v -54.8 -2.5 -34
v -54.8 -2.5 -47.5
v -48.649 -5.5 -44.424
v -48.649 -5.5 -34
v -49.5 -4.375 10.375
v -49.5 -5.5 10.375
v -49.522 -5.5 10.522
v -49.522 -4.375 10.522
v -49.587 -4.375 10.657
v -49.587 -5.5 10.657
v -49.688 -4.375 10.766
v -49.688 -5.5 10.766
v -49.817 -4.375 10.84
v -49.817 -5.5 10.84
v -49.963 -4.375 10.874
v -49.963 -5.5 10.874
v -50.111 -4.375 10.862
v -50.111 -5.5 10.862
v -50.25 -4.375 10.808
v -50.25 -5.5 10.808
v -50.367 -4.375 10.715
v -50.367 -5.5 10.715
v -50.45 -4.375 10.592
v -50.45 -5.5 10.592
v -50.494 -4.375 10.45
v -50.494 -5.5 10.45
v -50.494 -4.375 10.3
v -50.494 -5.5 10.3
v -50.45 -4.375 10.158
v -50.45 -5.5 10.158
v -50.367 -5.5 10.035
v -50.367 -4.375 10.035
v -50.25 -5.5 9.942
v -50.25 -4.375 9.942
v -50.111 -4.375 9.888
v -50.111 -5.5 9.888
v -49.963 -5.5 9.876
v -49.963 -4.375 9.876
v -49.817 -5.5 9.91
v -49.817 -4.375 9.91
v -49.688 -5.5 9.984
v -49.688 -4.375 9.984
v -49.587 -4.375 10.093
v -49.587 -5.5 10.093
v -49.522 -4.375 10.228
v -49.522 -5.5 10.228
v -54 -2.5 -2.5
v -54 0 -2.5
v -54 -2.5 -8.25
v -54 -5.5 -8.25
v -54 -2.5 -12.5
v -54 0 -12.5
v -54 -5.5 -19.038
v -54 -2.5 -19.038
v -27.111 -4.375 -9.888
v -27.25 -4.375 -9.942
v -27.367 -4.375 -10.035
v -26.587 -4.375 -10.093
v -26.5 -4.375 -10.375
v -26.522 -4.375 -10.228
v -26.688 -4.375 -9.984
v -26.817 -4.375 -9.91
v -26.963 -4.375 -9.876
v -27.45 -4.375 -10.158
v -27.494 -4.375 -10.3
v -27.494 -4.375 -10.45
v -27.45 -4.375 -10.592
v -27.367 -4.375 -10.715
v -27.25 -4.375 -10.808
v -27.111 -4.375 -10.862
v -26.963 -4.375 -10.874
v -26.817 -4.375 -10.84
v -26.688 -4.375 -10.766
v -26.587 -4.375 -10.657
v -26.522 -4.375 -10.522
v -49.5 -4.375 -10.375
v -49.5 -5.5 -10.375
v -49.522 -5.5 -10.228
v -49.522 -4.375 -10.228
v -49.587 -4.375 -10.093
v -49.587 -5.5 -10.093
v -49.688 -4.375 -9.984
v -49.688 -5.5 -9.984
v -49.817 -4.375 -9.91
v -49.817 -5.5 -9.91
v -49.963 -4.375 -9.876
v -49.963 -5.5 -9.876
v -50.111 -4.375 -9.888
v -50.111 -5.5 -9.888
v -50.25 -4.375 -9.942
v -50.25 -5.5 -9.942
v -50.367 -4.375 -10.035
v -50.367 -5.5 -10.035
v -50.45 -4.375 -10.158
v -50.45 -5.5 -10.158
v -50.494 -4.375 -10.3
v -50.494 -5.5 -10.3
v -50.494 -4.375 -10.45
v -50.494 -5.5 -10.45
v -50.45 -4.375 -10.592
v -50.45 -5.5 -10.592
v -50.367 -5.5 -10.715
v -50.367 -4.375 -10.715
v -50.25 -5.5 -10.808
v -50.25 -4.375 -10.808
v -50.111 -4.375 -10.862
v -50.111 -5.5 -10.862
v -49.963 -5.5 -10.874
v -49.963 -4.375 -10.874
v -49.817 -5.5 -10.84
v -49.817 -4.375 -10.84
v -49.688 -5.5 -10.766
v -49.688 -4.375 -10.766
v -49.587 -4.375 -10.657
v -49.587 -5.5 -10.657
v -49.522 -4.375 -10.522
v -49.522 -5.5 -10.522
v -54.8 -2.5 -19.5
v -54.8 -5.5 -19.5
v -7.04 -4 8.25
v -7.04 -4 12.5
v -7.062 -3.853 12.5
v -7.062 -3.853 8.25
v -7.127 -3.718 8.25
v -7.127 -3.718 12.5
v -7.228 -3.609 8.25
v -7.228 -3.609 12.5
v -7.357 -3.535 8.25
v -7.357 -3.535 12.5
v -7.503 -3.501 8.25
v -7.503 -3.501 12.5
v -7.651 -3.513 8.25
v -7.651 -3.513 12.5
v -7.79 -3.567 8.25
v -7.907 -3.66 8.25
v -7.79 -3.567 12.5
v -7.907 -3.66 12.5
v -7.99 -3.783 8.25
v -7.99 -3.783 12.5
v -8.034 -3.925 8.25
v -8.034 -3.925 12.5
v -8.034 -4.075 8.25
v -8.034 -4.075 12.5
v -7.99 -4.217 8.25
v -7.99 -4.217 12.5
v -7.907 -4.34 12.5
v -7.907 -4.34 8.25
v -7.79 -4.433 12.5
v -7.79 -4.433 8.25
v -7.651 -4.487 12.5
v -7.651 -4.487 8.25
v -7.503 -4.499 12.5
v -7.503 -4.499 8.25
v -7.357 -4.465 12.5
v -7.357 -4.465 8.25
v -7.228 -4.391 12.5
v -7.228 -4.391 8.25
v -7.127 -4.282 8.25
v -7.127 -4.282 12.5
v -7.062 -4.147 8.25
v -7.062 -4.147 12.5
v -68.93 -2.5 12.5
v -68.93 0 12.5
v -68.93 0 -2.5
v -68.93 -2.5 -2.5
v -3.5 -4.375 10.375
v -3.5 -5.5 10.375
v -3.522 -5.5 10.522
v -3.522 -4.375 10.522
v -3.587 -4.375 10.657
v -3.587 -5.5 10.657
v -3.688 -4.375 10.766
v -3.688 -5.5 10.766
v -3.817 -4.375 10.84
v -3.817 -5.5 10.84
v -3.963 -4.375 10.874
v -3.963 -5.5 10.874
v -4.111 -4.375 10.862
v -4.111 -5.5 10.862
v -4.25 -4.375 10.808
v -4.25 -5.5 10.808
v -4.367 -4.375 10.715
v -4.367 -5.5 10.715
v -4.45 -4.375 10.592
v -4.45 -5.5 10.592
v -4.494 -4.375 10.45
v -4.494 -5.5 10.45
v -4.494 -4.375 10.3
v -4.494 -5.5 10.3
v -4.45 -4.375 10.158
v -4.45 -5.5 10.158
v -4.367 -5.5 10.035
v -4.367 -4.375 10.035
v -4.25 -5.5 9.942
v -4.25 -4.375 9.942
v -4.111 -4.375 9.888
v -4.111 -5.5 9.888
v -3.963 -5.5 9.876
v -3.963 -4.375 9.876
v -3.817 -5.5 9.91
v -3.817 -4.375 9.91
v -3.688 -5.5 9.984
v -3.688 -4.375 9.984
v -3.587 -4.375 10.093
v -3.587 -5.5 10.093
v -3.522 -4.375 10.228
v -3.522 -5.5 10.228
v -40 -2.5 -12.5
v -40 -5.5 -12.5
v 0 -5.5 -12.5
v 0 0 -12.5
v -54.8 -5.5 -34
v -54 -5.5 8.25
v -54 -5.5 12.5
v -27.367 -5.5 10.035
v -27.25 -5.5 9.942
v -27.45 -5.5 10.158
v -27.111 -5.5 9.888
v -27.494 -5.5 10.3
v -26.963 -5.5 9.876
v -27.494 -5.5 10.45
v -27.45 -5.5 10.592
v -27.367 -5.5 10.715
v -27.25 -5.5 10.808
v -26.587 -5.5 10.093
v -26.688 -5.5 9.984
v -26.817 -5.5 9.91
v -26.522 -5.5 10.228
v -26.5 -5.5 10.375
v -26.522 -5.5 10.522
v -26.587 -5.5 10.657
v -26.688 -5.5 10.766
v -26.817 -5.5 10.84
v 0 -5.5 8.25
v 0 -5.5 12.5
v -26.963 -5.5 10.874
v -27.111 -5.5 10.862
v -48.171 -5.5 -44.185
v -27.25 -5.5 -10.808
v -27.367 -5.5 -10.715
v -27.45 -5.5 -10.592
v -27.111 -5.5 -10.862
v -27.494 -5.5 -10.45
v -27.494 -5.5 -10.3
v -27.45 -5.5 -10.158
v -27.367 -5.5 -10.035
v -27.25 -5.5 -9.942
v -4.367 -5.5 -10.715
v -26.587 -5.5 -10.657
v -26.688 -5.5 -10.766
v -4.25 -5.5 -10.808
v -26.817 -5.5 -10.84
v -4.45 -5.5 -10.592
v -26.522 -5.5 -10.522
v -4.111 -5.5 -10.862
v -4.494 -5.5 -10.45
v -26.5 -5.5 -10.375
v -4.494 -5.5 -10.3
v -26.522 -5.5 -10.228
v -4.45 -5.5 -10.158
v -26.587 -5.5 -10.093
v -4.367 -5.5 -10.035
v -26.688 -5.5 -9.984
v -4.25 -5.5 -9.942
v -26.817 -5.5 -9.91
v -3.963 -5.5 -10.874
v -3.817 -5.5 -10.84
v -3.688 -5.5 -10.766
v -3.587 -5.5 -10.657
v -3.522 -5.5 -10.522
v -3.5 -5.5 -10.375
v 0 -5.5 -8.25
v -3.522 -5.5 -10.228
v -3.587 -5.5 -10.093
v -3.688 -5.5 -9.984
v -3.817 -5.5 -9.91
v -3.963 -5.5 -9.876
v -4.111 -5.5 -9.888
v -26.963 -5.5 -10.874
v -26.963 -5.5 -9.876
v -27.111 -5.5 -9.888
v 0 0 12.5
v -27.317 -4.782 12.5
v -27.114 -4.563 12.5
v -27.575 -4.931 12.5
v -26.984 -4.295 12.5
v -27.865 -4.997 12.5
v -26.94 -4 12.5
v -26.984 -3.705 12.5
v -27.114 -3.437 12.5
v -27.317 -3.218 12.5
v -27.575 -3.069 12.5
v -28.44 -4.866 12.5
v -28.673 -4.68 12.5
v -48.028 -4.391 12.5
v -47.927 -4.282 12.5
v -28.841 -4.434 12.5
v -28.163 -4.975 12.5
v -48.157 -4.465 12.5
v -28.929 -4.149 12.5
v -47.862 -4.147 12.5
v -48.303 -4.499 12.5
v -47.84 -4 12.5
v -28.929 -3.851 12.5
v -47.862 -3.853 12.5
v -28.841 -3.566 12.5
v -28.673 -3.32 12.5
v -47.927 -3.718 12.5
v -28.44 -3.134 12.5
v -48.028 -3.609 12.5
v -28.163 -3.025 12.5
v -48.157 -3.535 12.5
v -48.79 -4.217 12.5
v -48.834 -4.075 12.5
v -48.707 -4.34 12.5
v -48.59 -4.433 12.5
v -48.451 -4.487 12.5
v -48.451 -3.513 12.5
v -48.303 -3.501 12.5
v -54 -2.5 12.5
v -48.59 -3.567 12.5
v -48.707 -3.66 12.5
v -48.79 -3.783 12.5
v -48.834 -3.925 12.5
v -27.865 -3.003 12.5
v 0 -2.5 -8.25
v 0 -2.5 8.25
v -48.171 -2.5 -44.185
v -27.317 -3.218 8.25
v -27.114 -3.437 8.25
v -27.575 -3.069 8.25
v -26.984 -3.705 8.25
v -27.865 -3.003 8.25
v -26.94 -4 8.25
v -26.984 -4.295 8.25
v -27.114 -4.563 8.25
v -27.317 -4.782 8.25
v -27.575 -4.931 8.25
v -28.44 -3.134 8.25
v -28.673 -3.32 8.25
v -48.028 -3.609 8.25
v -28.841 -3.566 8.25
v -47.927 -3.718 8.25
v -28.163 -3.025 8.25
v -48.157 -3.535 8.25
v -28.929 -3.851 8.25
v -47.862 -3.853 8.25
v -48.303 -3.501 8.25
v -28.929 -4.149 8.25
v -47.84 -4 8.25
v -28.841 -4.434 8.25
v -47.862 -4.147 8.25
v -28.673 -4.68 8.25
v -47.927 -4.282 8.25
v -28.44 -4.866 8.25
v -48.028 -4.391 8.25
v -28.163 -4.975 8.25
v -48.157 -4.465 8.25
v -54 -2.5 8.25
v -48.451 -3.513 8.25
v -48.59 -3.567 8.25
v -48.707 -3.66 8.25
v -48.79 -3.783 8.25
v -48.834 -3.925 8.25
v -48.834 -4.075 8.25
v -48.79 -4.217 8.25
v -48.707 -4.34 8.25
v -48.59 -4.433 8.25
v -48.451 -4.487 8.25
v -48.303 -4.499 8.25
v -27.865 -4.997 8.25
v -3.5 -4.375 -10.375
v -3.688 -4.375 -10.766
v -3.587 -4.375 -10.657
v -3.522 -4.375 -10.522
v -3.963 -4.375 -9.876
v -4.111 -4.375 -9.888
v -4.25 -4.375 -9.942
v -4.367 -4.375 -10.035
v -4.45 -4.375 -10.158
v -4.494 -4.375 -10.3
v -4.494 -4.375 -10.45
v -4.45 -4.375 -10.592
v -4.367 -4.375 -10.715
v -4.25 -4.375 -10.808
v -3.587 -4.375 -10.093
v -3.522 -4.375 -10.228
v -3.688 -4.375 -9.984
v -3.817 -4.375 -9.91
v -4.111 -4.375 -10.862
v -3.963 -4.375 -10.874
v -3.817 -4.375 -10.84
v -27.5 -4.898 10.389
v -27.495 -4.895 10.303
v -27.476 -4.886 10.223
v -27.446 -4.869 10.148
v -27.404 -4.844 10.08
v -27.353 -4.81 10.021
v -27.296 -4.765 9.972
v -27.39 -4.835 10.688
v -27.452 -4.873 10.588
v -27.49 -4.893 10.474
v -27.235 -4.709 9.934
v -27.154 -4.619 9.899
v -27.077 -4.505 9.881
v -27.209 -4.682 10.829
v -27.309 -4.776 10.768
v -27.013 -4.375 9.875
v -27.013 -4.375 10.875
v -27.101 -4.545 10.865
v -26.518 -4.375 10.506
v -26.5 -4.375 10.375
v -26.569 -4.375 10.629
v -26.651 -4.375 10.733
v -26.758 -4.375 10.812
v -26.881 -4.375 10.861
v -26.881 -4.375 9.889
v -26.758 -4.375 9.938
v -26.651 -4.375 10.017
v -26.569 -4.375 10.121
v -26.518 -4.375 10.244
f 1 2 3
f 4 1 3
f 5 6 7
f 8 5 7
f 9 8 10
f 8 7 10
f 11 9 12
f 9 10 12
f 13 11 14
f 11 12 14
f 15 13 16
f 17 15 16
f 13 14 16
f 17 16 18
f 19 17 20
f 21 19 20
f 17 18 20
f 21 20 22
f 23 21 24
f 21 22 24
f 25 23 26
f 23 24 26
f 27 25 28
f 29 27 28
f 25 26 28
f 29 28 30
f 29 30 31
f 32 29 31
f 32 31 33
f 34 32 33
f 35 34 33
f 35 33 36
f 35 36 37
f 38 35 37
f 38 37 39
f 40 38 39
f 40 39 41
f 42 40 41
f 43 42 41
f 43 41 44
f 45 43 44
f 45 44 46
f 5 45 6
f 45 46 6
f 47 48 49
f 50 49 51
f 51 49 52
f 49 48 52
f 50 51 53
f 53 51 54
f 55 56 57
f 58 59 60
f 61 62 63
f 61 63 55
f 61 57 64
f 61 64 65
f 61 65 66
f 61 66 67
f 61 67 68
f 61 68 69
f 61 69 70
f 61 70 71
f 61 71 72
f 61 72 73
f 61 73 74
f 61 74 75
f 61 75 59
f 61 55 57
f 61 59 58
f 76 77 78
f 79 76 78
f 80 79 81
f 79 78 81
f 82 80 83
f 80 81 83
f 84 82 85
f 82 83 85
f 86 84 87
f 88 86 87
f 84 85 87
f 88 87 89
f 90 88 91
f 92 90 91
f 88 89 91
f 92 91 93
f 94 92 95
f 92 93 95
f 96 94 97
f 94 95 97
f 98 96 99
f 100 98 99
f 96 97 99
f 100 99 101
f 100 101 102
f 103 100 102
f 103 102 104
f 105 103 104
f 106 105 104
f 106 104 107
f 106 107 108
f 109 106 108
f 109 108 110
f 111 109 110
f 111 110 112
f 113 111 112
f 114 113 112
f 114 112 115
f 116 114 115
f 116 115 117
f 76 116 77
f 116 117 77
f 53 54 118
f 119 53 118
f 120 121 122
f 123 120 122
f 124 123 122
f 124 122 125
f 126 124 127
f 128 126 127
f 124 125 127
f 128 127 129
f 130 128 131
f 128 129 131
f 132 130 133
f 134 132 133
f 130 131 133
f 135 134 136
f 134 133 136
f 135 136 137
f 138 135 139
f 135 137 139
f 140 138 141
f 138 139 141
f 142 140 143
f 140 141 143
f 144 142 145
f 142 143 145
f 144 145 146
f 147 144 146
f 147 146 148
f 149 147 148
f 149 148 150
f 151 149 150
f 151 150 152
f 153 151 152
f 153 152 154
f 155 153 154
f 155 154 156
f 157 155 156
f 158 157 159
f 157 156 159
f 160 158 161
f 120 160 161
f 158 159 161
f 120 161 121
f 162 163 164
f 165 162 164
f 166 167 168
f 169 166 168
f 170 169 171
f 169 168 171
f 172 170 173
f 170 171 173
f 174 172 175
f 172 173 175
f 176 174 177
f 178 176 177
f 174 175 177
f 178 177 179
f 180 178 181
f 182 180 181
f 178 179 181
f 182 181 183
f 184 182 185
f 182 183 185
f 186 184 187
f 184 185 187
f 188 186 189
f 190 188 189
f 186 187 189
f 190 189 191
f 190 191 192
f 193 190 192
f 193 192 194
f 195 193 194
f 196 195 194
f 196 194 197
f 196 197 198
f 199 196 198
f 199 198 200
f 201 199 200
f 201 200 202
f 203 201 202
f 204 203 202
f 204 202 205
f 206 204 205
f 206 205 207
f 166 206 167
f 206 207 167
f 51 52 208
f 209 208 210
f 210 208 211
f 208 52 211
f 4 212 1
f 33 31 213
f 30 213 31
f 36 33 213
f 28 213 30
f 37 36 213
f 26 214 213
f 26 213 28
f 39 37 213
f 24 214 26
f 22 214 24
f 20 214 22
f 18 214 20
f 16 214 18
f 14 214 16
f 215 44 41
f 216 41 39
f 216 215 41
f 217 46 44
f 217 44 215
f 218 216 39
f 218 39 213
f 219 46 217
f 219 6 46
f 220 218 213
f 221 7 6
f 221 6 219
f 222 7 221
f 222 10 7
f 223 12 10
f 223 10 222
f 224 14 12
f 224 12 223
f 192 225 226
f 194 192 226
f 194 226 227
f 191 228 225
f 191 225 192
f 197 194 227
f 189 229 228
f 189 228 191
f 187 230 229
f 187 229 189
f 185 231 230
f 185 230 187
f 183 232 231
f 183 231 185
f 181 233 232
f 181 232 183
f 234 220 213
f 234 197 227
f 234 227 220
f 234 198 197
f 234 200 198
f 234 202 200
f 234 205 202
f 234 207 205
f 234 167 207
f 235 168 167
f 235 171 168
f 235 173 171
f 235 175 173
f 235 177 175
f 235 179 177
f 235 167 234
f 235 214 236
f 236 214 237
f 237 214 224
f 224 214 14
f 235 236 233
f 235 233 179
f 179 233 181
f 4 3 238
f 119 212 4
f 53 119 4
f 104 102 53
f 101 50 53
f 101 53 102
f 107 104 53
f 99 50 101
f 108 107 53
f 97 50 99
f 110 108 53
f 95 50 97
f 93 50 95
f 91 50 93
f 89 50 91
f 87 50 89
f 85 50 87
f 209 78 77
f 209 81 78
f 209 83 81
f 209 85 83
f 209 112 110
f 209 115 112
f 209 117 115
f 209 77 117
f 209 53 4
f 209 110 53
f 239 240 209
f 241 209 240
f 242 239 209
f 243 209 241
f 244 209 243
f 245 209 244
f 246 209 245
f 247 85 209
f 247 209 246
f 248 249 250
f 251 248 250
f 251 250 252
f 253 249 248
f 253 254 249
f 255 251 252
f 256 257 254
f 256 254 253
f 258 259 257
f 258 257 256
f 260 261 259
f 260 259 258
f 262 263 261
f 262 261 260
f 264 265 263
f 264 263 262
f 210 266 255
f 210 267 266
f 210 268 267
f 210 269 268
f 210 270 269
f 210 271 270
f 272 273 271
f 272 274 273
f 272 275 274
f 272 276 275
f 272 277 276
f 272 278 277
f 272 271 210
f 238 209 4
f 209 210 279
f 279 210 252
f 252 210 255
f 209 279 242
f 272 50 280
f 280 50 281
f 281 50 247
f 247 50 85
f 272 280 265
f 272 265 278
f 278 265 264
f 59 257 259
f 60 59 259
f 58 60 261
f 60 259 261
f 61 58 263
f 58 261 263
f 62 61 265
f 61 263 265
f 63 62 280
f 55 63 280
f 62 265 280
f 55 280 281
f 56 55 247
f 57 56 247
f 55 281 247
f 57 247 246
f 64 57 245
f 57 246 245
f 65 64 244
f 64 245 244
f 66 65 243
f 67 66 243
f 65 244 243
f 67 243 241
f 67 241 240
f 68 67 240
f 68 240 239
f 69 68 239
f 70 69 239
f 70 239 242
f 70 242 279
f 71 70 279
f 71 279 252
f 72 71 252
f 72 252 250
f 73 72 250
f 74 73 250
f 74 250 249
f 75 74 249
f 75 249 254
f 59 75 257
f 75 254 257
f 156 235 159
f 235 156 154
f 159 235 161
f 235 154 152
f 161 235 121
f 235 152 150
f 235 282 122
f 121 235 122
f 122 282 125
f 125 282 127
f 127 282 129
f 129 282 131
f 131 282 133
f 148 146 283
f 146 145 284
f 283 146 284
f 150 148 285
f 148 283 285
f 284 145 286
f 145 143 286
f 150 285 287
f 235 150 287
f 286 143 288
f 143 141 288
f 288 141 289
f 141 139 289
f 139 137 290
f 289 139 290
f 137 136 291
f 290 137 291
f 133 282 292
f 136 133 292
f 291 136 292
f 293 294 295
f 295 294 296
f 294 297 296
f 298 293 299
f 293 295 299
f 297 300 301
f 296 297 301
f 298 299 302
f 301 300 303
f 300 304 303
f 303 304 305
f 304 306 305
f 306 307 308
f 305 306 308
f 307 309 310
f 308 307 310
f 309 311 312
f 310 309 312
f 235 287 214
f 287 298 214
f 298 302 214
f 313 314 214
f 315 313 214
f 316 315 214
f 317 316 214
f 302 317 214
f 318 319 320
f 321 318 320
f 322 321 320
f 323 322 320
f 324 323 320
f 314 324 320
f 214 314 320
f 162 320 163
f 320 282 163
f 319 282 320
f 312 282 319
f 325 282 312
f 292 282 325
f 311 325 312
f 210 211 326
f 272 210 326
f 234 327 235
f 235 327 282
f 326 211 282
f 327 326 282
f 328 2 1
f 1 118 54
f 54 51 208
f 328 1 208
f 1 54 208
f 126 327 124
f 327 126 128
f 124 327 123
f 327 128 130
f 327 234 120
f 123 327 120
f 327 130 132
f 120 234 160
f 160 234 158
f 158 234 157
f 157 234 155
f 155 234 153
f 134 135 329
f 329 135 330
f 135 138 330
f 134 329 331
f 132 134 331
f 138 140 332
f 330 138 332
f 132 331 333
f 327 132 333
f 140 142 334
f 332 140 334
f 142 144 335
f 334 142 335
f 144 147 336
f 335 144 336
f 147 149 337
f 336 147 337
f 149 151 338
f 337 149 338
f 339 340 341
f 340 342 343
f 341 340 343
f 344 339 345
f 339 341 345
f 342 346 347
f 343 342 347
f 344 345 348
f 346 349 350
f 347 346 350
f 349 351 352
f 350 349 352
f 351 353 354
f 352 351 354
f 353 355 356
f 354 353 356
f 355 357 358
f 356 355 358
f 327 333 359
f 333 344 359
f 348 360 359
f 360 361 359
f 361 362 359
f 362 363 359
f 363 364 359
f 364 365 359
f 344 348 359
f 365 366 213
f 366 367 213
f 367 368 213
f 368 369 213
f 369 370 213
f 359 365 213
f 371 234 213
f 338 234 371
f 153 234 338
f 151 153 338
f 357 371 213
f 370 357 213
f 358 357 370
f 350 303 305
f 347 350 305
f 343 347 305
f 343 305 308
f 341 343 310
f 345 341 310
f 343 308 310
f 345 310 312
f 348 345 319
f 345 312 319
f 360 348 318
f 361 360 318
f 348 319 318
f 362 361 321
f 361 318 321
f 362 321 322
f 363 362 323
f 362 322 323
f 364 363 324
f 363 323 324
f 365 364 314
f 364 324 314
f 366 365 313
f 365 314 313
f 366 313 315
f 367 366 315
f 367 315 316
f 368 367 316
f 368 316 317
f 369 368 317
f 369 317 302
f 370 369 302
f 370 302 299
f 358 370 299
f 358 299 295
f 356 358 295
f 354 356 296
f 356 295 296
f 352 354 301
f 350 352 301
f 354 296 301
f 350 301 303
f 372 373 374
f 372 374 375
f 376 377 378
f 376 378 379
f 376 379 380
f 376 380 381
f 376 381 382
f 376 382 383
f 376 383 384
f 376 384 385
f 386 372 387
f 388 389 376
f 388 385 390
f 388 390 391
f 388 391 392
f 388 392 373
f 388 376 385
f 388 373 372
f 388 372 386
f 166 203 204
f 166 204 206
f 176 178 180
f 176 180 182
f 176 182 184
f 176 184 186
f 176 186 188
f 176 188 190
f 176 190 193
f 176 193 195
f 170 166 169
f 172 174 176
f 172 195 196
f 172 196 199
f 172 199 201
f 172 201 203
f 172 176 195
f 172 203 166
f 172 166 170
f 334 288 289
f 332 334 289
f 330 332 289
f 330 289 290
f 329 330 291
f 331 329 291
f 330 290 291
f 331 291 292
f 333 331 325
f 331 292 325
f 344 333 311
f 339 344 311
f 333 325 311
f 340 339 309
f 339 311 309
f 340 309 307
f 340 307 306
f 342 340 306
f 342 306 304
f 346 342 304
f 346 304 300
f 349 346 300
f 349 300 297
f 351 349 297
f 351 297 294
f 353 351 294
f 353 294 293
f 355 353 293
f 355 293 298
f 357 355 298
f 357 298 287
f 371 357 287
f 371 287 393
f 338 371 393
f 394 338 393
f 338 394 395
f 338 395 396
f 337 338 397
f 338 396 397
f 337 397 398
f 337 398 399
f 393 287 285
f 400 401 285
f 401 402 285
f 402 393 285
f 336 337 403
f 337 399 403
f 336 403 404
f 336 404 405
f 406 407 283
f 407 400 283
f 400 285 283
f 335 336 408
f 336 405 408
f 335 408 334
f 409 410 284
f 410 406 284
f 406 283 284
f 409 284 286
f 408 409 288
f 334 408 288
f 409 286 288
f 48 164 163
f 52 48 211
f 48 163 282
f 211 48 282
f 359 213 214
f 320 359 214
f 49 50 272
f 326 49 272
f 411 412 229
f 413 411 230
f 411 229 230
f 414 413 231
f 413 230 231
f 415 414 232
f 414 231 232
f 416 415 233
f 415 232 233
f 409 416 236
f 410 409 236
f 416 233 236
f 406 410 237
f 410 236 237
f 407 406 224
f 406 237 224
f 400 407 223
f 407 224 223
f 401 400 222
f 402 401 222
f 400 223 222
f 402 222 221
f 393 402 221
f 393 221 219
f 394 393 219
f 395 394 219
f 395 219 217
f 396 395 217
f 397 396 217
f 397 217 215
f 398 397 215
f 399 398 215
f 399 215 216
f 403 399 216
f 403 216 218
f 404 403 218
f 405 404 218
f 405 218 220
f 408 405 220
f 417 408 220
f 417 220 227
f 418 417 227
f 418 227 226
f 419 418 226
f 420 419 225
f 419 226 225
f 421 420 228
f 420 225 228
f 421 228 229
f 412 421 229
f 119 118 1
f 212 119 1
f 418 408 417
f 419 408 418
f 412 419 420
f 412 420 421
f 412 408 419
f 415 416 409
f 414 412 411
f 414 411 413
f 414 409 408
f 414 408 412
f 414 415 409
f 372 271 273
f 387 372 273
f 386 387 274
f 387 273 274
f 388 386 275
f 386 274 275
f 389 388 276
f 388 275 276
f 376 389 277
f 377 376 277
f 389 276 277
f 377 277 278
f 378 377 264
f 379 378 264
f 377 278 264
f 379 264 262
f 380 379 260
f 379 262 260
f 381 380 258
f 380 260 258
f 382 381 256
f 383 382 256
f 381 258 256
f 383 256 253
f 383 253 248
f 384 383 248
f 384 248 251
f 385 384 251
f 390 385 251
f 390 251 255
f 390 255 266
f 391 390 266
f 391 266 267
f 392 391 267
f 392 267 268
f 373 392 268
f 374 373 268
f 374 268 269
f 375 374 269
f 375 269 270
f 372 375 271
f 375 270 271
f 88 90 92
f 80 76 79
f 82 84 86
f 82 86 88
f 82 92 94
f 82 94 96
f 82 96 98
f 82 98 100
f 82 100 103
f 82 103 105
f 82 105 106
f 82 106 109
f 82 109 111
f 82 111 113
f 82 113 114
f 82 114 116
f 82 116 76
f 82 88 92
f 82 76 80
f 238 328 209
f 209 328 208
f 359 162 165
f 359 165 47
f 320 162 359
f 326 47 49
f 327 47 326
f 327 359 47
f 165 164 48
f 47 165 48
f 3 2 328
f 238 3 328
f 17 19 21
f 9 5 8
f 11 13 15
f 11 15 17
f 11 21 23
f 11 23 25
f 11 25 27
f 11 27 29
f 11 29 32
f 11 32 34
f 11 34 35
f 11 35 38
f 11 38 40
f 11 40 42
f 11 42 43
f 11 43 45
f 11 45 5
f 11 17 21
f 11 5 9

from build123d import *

# Parameters (mm, degrees)
F1_DEPTH  = 5.5
F3_DEPTH  = 3
F4_R      = 0.5
F5_DEPTH  = 1.125
F9_DEPTH  = 12.5
F10_W     = 14.8
F10_H     = 2.5
F11_DEPTH = 47
F13_DEPTH = 13.5
F14_R     = 0.5
F15_DEPTH = 4.25
F16_R     = 1
F17_DEPTH = 4.25


with BuildPart() as f1:
    # F0 (on Front) → F1 (new body)
    with BuildSketch(Plane.XZ):
        Polygon((0, -12.5), (0, 12.5), (-68.93, 12.5), (-68.93, -2.5), (-54, -2.5), (-54, -19.0381197846), (-54.8, -19.5), (-54.8, -47.5), (-48.1705947427, -44.1845815863), (-40, -12.5), align=None)
    extrude(amount=F1_DEPTH)

    # F2 (on face) → F3 (cut)
    with BuildSketch(Plane.XZ.offset(5.5)):
        Polygon((0, -8.25), (0, 8.25), (-54, 8.25), (-54, 31.9336503744), (-73.7788975239, 31.9336503744), (-73.7788975239, -2.5), (-54, -2.5), (-54, -8.25), align=None)
    extrude(amount=-F3_DEPTH, mode=Mode.SUBTRACT)

    # F4 (on face) → F5 (cut)
    with BuildSketch(Plane.XZ.offset(5.5)):
        with Locations((-4, 10.375)):
            Circle(F4_R)
        with Locations((-27, 10.375)):
            Circle(F4_R)
        with Locations((-50, 10.375)):
            Circle(F4_R)
        with Locations((-50, -10.375)):
            Circle(F4_R)
        with Locations((-27, -10.375)):
            Circle(F4_R)
        with Locations((-4, -10.375)):
            Circle(F4_R)
    extrude(amount=-F5_DEPTH, mode=Mode.SUBTRACT)

    # F8 (on offset) → F9 (cut)
    with BuildSketch(Plane.XY.offset(30)):
        Polygon((-67.1257596039, 0), (-62, -2.5), (-62, 0), align=None)
    extrude(amount=-F9_DEPTH, mode=Mode.SUBTRACT)

    # F10 (on face) → F11 (cut)
    with BuildSketch(Plane(origin=(0, 0, -12.5), x_dir=(1, 0, 0), z_dir=(0, 0, -1))):
        with Locations((-47.4, 1.25)):
            Rectangle(F10_W, F10_H)
    extrude(amount=F11_DEPTH, mode=Mode.SUBTRACT)

    # F12 (on plane+point) → F13 (cut)
    with BuildSketch(Plane(origin=(0, 0, -47.5), x_dir=(1, 0, 0), z_dir=(0, 0, -1))):
        Polygon((-48.6490884753, 5.5), (-54.8, 5.5), (-54.8, 2.5), align=None)
    extrude(amount=-F13_DEPTH, mode=Mode.SUBTRACT)

    # F14 (on face) → F15 (cut, through all)
    with BuildSketch(Plane.XY.offset(12.5)):
        with Locations((-7.54, -4)):
            Circle(F14_R)
        with Locations((-48.34, -4)):
            Circle(F14_R)
    extrude(amount=-F15_DEPTH, mode=Mode.SUBTRACT)

    # F16 (on face) → F17 (cut, through all)
    with BuildSketch(Plane.XY.offset(12.5)):
        with Locations((-27.94, -4)):
            Circle(F16_R)
    extrude(amount=-F17_DEPTH, mode=Mode.SUBTRACT)


solid = f1.part
